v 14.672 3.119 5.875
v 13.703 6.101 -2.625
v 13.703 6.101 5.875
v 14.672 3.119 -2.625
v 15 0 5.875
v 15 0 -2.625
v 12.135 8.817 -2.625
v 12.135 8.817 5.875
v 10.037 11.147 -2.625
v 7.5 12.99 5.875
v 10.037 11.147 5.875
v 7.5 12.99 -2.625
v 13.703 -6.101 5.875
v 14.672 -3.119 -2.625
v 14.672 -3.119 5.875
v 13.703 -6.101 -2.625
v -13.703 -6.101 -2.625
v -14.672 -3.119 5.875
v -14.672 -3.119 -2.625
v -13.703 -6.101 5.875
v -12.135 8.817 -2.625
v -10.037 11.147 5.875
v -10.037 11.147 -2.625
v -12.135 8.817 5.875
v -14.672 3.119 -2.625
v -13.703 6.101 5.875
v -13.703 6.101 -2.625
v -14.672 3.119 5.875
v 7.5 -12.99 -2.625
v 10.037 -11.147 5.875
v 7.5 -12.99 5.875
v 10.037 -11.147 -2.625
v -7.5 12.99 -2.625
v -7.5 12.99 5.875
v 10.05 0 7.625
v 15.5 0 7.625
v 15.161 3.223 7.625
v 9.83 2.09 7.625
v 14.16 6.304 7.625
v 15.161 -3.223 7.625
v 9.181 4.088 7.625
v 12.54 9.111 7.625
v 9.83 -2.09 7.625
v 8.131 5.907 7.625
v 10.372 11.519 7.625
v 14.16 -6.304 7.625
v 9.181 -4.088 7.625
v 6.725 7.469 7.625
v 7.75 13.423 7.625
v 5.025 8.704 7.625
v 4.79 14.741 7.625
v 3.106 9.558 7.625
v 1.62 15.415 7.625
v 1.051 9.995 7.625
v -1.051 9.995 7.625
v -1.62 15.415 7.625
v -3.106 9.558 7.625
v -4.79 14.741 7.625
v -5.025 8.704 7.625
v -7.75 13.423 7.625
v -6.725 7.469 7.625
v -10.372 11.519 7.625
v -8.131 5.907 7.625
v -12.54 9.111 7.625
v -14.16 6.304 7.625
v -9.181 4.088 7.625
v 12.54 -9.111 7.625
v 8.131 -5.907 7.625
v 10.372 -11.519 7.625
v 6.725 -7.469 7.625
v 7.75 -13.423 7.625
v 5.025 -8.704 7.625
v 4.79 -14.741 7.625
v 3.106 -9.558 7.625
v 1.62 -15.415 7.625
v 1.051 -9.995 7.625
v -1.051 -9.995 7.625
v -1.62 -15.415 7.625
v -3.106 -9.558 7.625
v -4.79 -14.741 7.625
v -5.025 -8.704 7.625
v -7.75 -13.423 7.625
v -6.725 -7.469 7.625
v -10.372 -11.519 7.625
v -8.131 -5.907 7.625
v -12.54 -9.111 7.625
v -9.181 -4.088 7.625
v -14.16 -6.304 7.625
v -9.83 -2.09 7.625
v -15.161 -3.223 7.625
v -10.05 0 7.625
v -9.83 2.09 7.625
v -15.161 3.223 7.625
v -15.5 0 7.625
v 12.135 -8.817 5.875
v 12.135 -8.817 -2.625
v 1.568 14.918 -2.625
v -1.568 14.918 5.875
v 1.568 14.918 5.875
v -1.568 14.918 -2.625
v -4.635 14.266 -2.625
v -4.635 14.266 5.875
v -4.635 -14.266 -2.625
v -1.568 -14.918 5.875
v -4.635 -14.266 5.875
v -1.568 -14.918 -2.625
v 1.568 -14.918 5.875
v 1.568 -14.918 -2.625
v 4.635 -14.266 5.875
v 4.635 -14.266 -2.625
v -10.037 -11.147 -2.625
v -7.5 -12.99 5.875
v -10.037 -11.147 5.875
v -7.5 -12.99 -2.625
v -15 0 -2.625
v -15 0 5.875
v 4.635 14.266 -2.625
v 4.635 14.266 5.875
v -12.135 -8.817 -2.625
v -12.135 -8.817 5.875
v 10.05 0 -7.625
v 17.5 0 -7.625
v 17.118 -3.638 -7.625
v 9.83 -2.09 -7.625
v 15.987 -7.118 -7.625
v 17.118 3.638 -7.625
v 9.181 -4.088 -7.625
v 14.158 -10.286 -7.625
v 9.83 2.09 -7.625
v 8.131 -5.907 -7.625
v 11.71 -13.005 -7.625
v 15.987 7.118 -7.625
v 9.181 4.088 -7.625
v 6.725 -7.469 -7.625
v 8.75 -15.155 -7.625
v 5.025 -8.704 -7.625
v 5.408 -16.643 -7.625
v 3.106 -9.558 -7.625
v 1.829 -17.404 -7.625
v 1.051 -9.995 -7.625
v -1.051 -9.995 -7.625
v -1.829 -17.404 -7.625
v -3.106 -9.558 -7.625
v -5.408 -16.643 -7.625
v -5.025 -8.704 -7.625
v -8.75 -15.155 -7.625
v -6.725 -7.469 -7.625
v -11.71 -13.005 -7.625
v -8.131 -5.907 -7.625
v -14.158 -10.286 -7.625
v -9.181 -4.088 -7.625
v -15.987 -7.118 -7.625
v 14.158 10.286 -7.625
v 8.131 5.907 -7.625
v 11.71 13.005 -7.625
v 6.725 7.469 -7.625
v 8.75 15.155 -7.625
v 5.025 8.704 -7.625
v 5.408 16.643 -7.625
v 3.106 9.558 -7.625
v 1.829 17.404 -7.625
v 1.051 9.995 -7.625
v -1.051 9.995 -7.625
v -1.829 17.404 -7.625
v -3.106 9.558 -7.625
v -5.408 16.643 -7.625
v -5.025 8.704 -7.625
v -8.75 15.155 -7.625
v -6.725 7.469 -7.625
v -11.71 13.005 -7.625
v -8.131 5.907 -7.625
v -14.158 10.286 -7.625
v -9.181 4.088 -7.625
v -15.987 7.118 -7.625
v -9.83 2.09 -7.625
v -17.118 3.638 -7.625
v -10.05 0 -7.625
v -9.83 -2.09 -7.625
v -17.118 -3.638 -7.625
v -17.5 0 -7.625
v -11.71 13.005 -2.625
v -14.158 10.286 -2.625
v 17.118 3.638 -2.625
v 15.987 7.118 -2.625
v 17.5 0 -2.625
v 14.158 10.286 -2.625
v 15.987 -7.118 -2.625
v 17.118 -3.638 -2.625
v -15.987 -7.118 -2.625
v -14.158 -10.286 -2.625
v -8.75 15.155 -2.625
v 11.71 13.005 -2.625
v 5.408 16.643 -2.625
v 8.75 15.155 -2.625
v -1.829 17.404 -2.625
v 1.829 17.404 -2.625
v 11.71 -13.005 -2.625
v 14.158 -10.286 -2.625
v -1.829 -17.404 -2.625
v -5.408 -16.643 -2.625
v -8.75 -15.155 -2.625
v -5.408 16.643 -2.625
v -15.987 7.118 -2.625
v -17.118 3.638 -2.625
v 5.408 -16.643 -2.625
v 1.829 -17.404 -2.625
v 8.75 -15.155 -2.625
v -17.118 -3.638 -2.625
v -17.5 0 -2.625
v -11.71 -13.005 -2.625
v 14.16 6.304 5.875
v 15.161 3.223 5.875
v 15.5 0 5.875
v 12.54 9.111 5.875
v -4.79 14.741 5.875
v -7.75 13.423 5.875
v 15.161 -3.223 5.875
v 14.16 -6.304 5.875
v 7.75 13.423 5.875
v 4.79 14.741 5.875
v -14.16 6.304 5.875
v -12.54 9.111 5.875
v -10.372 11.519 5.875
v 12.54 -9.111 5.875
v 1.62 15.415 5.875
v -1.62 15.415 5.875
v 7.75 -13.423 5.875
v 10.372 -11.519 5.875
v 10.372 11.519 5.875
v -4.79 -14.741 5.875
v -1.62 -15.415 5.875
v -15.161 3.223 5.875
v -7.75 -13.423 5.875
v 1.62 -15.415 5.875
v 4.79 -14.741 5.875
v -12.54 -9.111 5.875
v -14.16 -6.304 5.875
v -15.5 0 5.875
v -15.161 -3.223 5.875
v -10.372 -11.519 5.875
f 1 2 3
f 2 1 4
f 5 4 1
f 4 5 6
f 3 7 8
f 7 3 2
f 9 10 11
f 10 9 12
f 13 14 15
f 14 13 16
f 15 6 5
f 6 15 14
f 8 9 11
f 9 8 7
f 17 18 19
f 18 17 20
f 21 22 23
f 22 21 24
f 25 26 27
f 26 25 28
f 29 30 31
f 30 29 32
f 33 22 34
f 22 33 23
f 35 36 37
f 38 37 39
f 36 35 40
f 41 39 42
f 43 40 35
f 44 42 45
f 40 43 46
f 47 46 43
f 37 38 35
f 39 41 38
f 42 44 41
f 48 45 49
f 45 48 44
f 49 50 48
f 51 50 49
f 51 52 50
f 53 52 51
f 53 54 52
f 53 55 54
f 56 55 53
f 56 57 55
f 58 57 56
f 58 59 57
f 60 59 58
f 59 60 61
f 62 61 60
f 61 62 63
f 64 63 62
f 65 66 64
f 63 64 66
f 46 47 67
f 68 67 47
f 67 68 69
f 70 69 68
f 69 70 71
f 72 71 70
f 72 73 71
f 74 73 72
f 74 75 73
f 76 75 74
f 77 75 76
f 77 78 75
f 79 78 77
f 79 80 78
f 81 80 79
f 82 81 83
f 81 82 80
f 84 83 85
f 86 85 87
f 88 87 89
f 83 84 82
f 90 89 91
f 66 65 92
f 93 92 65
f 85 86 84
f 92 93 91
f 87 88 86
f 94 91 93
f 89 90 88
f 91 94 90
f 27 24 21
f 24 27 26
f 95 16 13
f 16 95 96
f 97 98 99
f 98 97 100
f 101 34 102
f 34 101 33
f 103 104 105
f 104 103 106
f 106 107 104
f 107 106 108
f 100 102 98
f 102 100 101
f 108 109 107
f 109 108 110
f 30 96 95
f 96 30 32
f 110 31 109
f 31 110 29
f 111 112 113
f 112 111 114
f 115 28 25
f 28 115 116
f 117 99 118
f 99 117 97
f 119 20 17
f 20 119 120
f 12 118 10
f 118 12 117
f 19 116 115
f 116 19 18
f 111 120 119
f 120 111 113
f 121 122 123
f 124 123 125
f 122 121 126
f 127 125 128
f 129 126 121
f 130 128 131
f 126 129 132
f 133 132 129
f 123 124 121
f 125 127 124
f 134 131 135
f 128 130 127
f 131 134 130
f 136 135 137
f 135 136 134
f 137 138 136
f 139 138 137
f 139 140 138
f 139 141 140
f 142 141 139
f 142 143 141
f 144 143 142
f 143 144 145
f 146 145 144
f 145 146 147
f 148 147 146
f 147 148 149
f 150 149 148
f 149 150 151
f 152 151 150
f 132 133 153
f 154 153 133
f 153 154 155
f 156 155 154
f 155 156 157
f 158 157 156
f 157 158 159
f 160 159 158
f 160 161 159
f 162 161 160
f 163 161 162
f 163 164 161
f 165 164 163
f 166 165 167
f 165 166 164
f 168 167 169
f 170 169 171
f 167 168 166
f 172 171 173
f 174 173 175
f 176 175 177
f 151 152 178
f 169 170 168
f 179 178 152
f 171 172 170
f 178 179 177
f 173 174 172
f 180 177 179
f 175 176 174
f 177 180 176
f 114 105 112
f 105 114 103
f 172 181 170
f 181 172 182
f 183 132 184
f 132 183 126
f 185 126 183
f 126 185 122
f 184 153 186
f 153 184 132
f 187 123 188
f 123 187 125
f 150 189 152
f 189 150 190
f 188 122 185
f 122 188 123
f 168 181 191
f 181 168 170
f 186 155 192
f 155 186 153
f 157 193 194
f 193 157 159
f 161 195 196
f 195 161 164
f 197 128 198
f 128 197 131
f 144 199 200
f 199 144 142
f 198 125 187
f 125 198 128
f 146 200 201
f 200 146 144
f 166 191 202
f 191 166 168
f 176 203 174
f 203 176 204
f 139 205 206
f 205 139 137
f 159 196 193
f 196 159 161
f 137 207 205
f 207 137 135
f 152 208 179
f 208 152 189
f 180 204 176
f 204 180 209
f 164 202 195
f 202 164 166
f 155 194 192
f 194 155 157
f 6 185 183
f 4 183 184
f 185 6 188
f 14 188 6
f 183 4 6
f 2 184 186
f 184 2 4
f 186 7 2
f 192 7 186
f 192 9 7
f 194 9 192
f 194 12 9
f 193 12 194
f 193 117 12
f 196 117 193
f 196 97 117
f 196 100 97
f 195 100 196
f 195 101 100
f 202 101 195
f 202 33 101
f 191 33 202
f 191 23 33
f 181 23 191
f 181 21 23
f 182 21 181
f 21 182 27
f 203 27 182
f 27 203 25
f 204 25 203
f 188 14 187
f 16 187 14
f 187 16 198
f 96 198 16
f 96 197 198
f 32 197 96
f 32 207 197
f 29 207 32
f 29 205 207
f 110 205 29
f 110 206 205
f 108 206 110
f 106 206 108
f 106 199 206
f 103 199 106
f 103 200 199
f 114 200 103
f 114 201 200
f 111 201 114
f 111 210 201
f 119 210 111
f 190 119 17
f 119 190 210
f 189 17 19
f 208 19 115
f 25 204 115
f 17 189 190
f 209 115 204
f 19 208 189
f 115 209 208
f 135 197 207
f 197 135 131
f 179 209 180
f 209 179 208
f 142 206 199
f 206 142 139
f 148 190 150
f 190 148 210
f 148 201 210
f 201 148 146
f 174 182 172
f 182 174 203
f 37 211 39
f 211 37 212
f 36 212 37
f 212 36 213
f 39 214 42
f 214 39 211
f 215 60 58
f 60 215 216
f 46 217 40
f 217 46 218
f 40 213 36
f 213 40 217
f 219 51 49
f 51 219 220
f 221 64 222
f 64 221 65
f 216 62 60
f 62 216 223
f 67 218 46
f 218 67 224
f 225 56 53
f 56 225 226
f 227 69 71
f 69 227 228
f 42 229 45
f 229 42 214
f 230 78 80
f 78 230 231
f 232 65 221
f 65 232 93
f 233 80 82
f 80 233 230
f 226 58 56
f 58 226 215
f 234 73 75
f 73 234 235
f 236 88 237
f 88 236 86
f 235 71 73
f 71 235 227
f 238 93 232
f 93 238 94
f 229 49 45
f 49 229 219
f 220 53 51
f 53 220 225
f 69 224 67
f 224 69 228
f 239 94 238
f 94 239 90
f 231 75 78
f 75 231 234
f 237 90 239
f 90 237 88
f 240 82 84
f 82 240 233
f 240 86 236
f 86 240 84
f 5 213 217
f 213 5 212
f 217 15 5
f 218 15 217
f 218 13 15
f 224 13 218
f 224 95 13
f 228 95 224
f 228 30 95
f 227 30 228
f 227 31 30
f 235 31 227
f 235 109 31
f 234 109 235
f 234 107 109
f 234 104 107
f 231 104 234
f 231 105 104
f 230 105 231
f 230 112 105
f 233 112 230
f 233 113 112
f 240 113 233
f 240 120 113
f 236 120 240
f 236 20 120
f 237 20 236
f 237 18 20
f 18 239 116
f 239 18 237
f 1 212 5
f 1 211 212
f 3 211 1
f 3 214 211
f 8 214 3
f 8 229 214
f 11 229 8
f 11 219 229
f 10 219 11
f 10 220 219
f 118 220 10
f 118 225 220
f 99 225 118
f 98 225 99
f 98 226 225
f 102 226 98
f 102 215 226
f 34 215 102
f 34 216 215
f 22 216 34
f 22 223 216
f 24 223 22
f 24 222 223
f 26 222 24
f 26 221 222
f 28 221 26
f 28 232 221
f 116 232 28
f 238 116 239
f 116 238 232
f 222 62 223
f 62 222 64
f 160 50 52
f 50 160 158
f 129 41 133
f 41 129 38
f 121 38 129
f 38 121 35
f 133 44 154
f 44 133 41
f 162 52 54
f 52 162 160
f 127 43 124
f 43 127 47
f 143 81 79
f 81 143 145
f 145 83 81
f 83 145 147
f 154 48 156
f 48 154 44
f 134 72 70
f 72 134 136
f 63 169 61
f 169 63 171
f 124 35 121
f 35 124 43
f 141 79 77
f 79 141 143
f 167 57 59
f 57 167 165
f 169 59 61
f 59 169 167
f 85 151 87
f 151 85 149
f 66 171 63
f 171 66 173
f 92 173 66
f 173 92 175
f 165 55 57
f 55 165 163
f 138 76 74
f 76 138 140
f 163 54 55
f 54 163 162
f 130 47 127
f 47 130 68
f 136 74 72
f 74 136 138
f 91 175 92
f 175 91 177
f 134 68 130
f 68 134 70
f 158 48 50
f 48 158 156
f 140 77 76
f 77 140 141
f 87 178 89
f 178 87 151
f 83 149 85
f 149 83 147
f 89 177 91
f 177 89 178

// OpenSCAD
// file: spacerUtils.scad
/**
 * @file spacerUtils.scad
 *
 * @version 1.0
 *
 * @author Calum Judd Anderson
 *
 * @brief Aprilia RS 125 2006-2011 spacer utilities
 */
INTERFERENCE_FIT = 0.001;
SLIDE_FIT = 0.05;

SPROCKET_CARRIER_SPACER_HEIGHT = 17;
BRAKE_CARRIER_SPACER_HEIGHT = 15.25;

SPACER_OUTER_RADIUS = 15;
SPINDLE_RADIUS = 10;
SWINGING_ARM_FACE_RADIUS = 17.5;
SWINGING_ARM_FACE_HEIGHT = 5;

CAPTIVE_LIP_HEIGHT = 1.75;
CAPTIVE_LIP_RADIUS = SPACER_OUTER_RADIUS + 0.5;

SPROCKET_CARRIER_INNER_BEARING_SPACER_HEIGHT = 16.5;

SPROCKET_CARRIER_INNER_BEARING_OUTER_RADIUS = 12.475;
SPROCKET_CARRIER_INNER_BEARING_FACE_RADIUS = 16;
SPROCKET_CARRIER_INNER_BEARING_FACE_HEIGHT = 5.55;

/**
 * @brief Aprilia RS 125 2006-2011 rear brake carrier side spacer with captive flange
 */
module brakeCarrierSpacer() {
    difference() {
        union() {
            cylinder(BRAKE_CARRIER_SPACER_HEIGHT, SPACER_OUTER_RADIUS, SPACER_OUTER_RADIUS, center=true);
            translate([0, 0, (-(BRAKE_CARRIER_SPACER_HEIGHT -SWINGING_ARM_FACE_HEIGHT)/2)])
                cylinder(SWINGING_ARM_FACE_HEIGHT, SWINGING_ARM_FACE_RADIUS, SWINGING_ARM_FACE_RADIUS, center=true);
            translate([0, 0, ((BRAKE_CARRIER_SPACER_HEIGHT - CAPTIVE_LIP_HEIGHT)/2)])
                cylinder(CAPTIVE_LIP_HEIGHT, CAPTIVE_LIP_RADIUS, CAPTIVE_LIP_RADIUS, center=true);
        }
        cylinder(BRAKE_CARRIER_SPACER_HEIGHT + INTERFERENCE_FIT, SPINDLE_RADIUS + SLIDE_FIT, SPINDLE_RADIUS + SLIDE_FIT, center=true);
    }
}

/**
 * @brief Aprilia RS 125 2006-2011 rear sprocket carrier side internal spacer
 */
module sprocketCarrierInnerBearingSpacer() {
    difference() {
        union() {
            cylinder(SPROCKET_CARRIER_INNER_BEARING_SPACER_HEIGHT, SPROCKET_CARRIER_INNER_BEARING_OUTER_RADIUS, SPROCKET_CARRIER_INNER_BEARING_OUTER_RADIUS, center=true);
            translate([0, 0, (-(SPROCKET_CARRIER_INNER_BEARING_SPACER_HEIGHT -SPROCKET_CARRIER_INNER_BEARING_FACE_HEIGHT)/2)])
                cylinder(SPROCKET_CARRIER_INNER_BEARING_FACE_HEIGHT, SPROCKET_CARRIER_INNER_BEARING_FACE_RADIUS, SPROCKET_CARRIER_INNER_BEARING_FACE_RADIUS, center=true);
        }
        cylinder(SPROCKET_CARRIER_INNER_BEARING_SPACER_HEIGHT + INTERFERENCE_FIT, SPINDLE_RADIUS + SLIDE_FIT, SPINDLE_RADIUS + SLIDE_FIT, center=true);
    }
}

/**
 * @brief Aprilia RS 125 2006-2011 rear sprocket carrier side spacer with captive flange
 */
module sprocketCarrierSpacer() {
    difference() {
        union() {
            cylinder(SPROCKET_CARRIER_SPACER_HEIGHT, SPACER_OUTER_RADIUS, SPACER_OUTER_RADIUS, center=true);
            translate([0, 0, (-(SPROCKET_CARRIER_SPACER_HEIGHT -SWINGING_ARM_FACE_HEIGHT)/2)])
                cylinder(SWINGING_ARM_FACE_HEIGHT, SWINGING_ARM_FACE_RADIUS, SWINGING_ARM_FACE_RADIUS, center=true);
            translate([0, 0, ((SPROCKET_CARRIER_SPACER_HEIGHT - CAPTIVE_LIP_HEIGHT)/2)])
                cylinder(CAPTIVE_LIP_HEIGHT, CAPTIVE_LIP_RADIUS, CAPTIVE_LIP_RADIUS, center=true);
        }
        cylinder(SPROCKET_CARRIER_SPACER_HEIGHT + INTERFERENCE_FIT, SPINDLE_RADIUS + SLIDE_FIT, SPINDLE_RADIUS + SLIDE_FIT, center=true);
    }
}
// main file
/**
 * @file brakeCarrierSpacer.scad
 *
 * @version 1.0
 *
 * @author Calum Judd Anderson
 *
 * @brief Aprilia RS 125 2006-2011 rear spindle brake carrier side
 */
include <spacerUtils.scad>

brakeCarrierSpacer();
